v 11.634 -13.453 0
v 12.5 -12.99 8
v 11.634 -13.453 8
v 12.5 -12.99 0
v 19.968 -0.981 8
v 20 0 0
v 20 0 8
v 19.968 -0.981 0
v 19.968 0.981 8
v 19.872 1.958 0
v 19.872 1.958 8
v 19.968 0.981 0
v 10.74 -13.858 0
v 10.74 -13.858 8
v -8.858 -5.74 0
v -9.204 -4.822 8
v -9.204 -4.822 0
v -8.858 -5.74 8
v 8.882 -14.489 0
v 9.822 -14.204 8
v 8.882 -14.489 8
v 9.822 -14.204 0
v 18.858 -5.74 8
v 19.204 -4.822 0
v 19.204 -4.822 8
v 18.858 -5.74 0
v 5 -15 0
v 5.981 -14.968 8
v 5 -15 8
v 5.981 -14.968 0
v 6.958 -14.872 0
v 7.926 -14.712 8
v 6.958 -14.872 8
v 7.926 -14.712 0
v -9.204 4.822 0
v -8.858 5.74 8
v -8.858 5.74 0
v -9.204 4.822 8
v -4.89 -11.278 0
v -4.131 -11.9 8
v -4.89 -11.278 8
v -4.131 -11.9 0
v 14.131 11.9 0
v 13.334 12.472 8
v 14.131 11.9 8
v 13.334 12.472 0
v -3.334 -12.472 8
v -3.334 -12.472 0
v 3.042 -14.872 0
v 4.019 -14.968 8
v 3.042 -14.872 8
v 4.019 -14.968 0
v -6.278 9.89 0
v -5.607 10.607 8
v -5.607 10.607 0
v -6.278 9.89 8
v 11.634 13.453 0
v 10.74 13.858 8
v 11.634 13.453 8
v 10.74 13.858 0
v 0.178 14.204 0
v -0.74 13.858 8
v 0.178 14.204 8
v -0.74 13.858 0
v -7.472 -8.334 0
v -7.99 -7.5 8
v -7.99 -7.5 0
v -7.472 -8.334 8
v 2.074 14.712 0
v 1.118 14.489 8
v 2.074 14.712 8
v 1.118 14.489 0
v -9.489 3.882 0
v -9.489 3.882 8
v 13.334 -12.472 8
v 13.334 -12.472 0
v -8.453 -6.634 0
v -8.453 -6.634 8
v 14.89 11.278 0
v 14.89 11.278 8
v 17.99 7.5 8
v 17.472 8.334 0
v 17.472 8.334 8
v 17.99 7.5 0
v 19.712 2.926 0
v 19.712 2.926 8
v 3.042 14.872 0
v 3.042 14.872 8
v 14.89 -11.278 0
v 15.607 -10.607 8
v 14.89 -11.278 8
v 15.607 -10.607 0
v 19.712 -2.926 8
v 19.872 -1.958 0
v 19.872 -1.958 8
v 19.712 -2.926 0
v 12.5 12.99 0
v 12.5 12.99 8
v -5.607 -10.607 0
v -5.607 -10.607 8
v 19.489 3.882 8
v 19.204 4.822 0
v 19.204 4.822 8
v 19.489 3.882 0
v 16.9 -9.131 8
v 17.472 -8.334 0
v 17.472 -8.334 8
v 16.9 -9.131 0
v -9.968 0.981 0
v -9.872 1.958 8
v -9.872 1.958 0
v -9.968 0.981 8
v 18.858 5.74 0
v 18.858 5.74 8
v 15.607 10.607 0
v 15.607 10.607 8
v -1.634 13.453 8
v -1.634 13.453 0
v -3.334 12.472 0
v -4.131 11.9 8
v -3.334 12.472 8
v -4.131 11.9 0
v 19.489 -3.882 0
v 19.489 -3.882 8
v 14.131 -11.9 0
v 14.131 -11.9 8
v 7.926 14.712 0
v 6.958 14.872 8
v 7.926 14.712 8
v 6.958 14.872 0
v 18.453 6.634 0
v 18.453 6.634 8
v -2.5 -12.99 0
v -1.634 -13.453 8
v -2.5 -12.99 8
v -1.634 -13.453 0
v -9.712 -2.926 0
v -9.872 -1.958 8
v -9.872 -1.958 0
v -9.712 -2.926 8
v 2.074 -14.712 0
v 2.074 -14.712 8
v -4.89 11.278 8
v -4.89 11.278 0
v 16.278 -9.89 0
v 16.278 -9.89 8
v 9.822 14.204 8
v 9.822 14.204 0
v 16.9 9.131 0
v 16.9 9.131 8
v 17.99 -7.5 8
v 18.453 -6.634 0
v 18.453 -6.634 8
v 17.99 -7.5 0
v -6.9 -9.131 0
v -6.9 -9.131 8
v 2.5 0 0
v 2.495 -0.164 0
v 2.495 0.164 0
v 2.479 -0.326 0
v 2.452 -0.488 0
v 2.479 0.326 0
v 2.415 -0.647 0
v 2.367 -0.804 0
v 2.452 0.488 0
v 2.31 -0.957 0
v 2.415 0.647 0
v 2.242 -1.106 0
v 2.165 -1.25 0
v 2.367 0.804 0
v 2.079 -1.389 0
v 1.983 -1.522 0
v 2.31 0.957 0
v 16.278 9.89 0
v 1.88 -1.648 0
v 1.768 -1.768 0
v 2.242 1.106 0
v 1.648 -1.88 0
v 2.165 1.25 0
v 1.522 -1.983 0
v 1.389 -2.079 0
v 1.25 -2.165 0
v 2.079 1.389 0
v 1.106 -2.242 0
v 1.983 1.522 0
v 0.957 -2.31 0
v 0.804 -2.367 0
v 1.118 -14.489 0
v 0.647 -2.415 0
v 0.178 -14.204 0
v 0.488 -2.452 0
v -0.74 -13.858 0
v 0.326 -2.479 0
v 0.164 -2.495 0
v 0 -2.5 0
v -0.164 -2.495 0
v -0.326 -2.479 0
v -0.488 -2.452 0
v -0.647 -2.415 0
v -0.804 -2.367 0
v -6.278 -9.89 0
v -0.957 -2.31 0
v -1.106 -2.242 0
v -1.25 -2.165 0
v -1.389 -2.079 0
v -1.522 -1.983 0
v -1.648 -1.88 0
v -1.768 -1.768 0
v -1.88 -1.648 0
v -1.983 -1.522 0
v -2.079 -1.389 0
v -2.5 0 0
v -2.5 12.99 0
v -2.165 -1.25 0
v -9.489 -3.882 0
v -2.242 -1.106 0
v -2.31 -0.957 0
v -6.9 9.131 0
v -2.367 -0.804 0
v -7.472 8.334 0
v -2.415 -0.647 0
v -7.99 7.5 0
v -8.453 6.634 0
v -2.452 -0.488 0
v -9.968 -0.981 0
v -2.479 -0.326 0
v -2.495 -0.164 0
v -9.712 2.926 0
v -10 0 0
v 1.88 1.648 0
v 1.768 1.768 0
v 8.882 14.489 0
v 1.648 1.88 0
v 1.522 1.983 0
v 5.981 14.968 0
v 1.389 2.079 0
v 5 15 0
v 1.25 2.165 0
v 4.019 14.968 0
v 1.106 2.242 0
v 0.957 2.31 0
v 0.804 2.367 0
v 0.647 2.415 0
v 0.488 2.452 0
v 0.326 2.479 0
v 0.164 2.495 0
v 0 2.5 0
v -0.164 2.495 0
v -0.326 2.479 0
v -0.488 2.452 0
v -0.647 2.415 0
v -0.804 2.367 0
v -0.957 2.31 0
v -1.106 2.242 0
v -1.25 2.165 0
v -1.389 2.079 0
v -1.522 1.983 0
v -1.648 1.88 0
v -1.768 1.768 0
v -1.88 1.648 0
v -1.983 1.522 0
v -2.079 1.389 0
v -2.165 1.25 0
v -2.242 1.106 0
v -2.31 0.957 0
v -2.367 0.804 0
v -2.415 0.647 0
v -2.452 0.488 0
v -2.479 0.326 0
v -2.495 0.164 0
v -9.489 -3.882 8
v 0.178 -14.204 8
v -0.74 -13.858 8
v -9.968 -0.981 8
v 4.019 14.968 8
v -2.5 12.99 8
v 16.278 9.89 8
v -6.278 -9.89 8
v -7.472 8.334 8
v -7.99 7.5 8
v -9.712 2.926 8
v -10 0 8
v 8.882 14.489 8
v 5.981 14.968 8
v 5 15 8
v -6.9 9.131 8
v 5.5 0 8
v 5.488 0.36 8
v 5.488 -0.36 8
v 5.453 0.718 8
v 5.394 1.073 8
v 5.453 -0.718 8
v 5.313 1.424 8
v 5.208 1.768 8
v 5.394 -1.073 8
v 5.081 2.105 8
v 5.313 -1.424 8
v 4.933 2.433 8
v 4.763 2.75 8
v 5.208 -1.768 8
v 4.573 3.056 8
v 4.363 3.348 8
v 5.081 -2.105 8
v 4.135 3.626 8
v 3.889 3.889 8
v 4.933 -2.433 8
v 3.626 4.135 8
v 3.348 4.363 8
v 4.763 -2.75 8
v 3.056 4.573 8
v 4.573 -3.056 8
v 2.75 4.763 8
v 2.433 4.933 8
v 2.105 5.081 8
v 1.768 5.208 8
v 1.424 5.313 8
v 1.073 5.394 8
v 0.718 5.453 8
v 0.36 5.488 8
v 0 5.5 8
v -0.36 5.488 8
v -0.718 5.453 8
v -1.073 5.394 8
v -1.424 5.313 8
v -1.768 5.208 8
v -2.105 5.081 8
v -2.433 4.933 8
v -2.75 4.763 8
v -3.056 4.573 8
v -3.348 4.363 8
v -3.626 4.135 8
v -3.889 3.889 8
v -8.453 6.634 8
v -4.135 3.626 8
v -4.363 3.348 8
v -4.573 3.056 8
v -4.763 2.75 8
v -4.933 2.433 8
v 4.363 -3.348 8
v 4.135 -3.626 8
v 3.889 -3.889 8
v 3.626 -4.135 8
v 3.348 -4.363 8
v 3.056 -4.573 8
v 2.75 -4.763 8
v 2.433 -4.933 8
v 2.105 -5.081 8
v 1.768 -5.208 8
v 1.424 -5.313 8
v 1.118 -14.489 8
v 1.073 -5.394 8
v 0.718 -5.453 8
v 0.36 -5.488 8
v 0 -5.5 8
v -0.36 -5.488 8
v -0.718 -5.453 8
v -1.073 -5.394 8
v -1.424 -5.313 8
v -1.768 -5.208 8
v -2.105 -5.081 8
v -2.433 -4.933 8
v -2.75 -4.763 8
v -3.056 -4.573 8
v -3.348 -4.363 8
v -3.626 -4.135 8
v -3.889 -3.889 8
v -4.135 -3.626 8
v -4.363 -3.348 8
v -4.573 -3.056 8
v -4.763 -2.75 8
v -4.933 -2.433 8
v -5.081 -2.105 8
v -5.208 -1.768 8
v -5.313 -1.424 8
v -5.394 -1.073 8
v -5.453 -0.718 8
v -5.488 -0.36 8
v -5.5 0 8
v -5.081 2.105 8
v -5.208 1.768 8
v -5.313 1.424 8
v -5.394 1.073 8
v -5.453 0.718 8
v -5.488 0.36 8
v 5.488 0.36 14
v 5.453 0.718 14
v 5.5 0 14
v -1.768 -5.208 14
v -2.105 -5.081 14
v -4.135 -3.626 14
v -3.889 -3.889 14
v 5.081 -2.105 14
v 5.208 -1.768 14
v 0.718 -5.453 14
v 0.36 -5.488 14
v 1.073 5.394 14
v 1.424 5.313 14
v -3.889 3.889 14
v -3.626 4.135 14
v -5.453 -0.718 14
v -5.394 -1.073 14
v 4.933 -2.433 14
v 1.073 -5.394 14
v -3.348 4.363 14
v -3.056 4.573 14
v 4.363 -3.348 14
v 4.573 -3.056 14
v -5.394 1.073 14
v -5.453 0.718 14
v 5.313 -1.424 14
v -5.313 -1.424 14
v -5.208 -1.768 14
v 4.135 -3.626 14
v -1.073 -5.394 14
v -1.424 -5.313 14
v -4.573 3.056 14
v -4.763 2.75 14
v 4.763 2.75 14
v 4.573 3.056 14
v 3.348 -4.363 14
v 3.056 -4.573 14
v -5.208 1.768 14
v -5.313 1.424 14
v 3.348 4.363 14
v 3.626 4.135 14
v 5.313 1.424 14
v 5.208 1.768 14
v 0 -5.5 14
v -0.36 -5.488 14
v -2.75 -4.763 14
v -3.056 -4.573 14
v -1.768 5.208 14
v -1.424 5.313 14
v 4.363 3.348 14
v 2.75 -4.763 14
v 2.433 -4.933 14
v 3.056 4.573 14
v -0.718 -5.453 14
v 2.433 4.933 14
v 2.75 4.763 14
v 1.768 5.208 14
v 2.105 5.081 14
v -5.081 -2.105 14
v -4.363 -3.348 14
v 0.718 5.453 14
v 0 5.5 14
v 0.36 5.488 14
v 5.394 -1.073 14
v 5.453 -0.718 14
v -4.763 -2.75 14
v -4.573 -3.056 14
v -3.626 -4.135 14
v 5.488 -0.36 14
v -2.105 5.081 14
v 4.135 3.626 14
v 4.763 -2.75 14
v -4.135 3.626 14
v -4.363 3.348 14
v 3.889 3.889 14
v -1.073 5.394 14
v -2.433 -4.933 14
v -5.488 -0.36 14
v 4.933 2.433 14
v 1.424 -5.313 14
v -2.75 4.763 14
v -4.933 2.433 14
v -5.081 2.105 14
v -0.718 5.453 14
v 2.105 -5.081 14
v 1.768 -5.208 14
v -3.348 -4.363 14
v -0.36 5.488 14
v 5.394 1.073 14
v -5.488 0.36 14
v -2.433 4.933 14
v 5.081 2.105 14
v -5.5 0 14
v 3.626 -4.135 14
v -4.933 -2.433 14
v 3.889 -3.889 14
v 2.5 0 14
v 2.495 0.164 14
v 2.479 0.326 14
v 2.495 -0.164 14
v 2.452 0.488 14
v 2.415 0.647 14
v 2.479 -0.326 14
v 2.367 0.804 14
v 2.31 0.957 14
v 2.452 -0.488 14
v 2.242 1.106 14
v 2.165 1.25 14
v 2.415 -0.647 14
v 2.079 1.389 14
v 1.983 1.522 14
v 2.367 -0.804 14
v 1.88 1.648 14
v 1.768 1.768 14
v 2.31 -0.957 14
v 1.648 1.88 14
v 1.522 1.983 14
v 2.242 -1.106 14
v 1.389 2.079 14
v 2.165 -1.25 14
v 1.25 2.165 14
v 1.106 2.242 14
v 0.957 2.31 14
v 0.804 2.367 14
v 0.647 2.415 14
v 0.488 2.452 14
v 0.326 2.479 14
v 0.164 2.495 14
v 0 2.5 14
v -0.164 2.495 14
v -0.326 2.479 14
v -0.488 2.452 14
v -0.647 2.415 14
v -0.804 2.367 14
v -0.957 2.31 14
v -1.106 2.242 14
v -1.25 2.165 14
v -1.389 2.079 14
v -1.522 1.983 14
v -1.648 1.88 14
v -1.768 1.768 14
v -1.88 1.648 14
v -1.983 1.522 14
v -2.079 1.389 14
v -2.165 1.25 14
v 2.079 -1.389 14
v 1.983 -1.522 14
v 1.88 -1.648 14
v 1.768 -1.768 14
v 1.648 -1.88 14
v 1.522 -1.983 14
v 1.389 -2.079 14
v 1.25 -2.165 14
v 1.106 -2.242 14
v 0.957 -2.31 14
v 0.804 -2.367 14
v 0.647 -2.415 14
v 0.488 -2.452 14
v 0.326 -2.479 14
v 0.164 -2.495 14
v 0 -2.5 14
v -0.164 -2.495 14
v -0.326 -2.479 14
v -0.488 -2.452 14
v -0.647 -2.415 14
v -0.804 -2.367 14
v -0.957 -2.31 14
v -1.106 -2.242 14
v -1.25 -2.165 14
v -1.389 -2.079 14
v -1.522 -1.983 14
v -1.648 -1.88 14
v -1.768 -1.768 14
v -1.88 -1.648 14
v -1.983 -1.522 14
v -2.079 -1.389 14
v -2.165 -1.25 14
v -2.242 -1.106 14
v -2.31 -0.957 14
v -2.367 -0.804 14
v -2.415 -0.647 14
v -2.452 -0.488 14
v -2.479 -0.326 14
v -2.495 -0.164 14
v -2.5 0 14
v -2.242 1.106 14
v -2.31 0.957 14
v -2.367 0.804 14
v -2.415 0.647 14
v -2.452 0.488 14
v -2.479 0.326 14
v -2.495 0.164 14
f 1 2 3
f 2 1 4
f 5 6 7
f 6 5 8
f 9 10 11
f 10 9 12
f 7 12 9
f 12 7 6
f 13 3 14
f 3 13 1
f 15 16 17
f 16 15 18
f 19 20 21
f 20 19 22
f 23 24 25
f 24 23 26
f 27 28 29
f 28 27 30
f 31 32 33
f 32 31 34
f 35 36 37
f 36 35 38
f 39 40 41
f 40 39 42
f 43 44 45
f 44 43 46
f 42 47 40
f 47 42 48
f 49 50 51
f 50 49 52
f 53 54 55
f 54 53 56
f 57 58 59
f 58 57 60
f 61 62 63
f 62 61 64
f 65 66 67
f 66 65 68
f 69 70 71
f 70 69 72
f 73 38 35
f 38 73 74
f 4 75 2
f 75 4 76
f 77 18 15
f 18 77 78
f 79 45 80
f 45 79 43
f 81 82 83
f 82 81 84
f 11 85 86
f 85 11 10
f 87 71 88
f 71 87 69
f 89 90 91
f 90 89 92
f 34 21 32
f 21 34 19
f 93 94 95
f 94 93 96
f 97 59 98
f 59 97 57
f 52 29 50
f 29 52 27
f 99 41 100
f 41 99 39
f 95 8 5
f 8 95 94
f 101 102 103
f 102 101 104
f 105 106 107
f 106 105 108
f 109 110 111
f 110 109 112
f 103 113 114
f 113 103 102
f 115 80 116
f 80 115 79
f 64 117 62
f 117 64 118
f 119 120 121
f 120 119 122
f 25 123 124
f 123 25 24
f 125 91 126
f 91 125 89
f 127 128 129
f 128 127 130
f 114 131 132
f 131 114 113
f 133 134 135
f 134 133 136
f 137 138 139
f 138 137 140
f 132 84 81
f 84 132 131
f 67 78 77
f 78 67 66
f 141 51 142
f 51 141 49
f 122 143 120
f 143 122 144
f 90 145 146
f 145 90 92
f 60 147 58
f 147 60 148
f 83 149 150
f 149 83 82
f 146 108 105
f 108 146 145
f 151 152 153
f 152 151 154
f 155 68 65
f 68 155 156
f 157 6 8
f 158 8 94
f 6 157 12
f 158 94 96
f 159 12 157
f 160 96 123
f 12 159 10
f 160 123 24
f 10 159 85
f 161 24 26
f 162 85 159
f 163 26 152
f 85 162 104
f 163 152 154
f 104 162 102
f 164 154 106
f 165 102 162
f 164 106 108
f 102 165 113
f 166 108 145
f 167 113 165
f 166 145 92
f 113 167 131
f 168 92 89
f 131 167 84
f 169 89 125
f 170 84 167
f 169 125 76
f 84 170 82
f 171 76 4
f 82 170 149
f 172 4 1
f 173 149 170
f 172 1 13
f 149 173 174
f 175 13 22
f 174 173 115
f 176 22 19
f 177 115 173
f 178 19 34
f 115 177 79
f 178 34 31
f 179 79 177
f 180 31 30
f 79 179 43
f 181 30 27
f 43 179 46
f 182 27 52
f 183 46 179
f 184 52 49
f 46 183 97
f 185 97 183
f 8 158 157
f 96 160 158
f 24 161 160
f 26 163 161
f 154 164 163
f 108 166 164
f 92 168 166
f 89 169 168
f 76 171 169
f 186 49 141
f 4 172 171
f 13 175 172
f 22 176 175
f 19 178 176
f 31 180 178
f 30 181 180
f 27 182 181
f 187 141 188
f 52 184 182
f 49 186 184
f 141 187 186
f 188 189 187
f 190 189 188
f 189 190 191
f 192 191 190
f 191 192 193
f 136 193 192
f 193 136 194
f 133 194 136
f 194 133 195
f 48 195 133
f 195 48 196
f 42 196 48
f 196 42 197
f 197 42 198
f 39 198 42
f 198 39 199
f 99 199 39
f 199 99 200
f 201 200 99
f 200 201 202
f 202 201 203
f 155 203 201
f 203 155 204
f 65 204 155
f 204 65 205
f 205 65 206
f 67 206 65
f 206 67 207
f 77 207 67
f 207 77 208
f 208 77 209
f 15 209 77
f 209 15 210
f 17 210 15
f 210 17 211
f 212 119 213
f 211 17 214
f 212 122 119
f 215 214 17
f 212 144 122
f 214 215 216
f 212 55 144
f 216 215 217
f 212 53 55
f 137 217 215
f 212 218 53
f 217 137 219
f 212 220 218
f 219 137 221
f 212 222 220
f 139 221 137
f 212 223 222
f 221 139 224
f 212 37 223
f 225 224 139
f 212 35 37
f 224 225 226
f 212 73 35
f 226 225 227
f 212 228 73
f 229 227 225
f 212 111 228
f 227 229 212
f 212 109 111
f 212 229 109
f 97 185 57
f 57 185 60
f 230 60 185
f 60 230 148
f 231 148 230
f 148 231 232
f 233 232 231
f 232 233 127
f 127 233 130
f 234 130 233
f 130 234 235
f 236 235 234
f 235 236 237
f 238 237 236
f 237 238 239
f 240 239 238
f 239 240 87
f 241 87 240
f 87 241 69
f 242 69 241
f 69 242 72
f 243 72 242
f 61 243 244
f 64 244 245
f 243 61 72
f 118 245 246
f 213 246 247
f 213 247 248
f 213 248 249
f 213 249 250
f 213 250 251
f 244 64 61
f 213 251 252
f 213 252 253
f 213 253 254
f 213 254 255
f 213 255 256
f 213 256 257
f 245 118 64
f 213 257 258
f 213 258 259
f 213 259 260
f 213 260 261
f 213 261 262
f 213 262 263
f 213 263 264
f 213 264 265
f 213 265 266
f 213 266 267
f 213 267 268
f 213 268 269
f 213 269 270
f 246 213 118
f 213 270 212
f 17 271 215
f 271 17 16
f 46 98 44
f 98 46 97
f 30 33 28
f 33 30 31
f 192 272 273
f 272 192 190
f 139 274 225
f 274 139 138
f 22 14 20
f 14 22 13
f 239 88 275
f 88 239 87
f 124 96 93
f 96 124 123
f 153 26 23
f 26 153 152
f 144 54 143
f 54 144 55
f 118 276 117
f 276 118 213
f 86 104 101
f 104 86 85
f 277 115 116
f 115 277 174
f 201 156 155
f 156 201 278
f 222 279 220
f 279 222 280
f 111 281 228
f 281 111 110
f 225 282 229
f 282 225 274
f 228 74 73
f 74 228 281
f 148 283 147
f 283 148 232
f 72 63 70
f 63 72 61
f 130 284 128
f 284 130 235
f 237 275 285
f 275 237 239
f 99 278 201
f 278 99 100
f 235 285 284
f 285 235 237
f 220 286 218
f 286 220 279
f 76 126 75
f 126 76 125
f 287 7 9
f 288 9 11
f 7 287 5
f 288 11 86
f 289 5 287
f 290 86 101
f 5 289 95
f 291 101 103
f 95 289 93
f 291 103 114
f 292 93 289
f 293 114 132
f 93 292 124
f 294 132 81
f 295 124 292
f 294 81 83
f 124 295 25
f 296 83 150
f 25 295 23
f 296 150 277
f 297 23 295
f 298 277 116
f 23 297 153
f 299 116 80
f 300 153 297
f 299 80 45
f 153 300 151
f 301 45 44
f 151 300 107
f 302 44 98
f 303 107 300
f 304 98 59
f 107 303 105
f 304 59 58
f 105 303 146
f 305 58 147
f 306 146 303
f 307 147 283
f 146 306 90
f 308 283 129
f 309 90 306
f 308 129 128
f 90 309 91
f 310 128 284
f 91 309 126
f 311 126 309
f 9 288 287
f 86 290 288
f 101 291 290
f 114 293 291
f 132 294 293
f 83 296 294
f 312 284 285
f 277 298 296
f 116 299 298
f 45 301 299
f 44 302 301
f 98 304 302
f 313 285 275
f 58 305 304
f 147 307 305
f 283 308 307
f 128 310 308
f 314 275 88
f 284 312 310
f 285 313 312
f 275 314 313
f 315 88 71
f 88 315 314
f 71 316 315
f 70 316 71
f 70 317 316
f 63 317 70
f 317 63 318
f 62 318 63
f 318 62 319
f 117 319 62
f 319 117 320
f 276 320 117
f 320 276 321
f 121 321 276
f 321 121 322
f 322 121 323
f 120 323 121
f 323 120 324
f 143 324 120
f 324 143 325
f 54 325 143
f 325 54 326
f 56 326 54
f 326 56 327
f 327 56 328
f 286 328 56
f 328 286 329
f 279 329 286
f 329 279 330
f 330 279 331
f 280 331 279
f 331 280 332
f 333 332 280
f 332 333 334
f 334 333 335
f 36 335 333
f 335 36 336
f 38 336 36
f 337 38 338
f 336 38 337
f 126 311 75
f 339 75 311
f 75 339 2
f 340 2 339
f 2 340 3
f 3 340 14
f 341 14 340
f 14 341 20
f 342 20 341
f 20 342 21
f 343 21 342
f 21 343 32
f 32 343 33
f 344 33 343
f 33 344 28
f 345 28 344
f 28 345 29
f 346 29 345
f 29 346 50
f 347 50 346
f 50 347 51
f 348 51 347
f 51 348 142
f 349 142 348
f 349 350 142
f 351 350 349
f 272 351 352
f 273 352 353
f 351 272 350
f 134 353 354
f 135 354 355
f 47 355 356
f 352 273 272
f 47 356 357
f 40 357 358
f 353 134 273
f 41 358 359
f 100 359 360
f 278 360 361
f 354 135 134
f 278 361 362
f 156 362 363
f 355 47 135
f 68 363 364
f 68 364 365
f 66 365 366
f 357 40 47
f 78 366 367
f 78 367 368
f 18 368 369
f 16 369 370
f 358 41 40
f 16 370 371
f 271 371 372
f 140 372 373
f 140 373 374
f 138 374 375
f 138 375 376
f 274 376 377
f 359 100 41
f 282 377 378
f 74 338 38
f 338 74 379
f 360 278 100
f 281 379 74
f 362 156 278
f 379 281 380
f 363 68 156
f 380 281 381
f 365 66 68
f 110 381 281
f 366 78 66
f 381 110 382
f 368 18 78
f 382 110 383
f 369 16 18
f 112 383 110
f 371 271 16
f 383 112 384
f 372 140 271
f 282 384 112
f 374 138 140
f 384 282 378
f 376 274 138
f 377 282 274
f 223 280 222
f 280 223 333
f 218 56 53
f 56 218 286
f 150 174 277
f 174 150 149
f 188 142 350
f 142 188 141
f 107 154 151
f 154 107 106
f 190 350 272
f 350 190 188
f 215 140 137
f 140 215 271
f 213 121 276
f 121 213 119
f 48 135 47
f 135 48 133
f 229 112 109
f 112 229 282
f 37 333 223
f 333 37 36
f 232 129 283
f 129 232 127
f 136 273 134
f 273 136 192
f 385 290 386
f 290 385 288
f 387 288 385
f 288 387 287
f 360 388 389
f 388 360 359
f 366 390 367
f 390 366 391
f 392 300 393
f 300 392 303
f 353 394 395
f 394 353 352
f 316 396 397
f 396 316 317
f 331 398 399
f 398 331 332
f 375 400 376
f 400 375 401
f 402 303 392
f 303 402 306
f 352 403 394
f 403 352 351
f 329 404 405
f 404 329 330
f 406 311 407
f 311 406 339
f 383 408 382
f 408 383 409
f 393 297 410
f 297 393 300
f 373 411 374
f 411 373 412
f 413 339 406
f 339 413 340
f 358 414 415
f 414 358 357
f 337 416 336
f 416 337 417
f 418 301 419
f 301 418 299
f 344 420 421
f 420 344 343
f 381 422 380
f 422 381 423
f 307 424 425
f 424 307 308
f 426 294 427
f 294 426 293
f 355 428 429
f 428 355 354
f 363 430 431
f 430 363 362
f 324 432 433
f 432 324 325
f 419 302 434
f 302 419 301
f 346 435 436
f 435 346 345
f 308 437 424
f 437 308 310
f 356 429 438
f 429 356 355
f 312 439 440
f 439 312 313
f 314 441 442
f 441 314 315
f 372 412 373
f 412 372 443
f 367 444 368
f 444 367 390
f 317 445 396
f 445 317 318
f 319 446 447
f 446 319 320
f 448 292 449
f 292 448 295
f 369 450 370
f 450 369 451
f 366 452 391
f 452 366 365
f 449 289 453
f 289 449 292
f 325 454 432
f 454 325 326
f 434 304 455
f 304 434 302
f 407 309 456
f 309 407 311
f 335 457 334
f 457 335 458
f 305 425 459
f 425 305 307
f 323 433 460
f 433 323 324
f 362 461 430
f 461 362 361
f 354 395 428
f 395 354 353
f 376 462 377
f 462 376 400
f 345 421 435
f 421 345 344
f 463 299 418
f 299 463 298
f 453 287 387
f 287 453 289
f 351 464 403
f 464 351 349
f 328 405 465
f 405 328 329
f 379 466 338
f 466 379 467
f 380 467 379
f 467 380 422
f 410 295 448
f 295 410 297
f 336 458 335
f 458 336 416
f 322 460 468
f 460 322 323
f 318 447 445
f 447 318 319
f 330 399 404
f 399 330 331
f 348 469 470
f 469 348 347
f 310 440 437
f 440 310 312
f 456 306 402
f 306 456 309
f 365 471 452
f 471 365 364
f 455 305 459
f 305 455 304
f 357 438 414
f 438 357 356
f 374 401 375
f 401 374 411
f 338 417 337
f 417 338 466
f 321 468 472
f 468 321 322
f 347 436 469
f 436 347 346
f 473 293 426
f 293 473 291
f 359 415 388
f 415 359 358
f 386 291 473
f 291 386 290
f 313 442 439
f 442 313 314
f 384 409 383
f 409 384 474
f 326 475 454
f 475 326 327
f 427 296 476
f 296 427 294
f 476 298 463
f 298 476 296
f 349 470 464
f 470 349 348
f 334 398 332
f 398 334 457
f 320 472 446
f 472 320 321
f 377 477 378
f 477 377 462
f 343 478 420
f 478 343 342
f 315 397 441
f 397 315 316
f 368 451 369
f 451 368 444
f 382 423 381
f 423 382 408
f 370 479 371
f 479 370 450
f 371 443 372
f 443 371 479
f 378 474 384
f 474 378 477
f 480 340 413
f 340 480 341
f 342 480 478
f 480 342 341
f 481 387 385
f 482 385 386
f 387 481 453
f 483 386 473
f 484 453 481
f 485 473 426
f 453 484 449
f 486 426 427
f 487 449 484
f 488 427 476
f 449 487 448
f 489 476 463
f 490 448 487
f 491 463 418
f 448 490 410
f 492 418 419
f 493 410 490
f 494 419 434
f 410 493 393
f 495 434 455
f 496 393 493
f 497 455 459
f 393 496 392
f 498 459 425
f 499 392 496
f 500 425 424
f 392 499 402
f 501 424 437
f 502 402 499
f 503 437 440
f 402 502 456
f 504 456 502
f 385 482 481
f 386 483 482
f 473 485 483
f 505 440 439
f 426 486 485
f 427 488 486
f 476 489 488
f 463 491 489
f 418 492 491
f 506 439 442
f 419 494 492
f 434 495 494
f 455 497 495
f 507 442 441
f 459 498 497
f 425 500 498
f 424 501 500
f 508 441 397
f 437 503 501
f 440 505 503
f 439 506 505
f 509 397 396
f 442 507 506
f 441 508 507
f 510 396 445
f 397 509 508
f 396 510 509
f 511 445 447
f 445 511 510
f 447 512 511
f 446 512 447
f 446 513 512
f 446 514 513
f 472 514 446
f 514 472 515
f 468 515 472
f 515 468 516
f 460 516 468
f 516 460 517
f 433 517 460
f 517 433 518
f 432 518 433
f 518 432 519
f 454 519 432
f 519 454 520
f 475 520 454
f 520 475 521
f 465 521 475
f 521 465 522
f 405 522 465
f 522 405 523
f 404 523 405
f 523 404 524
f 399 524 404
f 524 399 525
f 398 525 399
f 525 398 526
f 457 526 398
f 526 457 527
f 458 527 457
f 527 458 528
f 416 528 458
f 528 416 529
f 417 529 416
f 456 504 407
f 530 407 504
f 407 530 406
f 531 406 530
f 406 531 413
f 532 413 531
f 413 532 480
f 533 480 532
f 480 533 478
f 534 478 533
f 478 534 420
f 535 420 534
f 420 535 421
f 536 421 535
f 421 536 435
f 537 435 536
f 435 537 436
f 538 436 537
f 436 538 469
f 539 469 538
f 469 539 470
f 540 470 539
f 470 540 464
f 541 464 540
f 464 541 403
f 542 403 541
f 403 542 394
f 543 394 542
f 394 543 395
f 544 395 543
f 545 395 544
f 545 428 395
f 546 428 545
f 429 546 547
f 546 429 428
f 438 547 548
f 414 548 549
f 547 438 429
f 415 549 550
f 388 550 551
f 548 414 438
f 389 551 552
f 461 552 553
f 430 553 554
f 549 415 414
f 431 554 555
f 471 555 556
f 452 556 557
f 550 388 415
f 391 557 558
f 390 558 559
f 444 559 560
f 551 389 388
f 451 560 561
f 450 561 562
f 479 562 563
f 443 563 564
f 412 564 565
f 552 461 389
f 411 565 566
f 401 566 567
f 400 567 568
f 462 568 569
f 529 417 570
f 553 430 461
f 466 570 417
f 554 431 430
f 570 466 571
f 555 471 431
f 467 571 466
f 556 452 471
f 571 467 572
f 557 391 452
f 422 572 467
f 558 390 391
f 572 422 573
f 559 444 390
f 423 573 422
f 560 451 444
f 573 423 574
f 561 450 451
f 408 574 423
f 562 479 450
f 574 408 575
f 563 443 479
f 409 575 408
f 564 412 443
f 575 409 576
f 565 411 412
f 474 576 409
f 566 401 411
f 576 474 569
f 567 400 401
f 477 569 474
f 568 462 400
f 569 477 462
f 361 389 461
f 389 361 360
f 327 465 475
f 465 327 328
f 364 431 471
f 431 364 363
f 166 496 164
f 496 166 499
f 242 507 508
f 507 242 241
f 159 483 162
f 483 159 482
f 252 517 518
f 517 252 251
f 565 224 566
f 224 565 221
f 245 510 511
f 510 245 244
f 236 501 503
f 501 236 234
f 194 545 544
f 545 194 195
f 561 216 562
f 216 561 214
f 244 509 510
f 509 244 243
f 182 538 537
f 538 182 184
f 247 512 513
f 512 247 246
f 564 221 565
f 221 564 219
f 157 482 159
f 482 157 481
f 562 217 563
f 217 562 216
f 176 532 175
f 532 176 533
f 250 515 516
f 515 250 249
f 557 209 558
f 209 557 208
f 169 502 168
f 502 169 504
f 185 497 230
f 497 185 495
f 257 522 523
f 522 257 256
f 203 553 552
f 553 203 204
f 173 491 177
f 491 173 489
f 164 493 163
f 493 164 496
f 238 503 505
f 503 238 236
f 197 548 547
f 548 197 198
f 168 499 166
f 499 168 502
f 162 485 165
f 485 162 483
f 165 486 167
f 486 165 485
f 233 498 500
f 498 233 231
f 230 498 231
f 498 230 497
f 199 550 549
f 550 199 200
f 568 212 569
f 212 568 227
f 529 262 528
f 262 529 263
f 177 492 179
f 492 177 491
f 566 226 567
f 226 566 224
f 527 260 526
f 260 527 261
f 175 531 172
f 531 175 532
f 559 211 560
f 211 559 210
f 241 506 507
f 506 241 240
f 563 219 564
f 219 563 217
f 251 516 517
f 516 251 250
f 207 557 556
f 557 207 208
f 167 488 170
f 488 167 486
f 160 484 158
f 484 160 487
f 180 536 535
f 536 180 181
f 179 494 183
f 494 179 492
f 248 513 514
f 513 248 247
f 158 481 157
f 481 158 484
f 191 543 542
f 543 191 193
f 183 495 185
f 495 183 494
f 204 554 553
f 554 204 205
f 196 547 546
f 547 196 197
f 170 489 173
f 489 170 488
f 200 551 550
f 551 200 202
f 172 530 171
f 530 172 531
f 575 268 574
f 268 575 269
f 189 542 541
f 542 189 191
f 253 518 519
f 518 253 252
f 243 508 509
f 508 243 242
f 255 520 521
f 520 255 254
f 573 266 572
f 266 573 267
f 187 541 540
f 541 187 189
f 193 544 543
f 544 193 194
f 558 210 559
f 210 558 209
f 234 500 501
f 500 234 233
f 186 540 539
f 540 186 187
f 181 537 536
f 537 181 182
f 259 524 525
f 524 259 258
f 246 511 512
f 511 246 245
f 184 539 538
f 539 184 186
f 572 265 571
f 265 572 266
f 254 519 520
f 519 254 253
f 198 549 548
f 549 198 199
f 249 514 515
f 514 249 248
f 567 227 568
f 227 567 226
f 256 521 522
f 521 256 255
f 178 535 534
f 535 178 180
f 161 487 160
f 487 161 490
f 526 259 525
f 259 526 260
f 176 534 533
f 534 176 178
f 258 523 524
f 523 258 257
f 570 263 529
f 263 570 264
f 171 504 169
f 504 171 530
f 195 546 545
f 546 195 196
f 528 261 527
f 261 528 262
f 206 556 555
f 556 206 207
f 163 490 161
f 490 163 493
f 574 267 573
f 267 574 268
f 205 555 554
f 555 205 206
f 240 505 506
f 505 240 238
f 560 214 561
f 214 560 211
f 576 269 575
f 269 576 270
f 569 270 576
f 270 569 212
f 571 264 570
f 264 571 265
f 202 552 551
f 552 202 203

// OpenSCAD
// Eccentric cam for shaker mechanism
// Print orientation: disc flat on bed (z = 0), hub upward.
// Shaft axis = Z axis (x = 0, y = 0); disc centre offset in +X.

$fn = 96;

// --- Dimensions (mm) ---
disc_d      = 30;   // cam disc diameter
disc_t      = 8;    // cam disc thickness
eccentric   = 5;    // offset of disc centre from shaft axis (along X)
hub_d       = 11;   // hub diameter (on shaft axis)
hub_h       = 6;    // hub height above disc (z = 8 to 14)
shaft_d     = 5;    // shaft bore diameter
eps         = 0.5;  // overcut for clean differences

difference() {
    union() {
        // Eccentric disc
        translate([eccentric, 0, 0])
            cylinder(d = disc_d, h = disc_t);

        // Hub on shaft axis, overlapping the disc slightly for a solid union
        translate([0, 0, disc_t - 0.01])
            cylinder(d = hub_d, h = hub_h + 0.01);
    }

    // Shaft bore through hub and disc
    translate([0, 0, -eps])
        cylinder(d = shaft_d, h = disc_t + hub_h + 2 * eps);
}
